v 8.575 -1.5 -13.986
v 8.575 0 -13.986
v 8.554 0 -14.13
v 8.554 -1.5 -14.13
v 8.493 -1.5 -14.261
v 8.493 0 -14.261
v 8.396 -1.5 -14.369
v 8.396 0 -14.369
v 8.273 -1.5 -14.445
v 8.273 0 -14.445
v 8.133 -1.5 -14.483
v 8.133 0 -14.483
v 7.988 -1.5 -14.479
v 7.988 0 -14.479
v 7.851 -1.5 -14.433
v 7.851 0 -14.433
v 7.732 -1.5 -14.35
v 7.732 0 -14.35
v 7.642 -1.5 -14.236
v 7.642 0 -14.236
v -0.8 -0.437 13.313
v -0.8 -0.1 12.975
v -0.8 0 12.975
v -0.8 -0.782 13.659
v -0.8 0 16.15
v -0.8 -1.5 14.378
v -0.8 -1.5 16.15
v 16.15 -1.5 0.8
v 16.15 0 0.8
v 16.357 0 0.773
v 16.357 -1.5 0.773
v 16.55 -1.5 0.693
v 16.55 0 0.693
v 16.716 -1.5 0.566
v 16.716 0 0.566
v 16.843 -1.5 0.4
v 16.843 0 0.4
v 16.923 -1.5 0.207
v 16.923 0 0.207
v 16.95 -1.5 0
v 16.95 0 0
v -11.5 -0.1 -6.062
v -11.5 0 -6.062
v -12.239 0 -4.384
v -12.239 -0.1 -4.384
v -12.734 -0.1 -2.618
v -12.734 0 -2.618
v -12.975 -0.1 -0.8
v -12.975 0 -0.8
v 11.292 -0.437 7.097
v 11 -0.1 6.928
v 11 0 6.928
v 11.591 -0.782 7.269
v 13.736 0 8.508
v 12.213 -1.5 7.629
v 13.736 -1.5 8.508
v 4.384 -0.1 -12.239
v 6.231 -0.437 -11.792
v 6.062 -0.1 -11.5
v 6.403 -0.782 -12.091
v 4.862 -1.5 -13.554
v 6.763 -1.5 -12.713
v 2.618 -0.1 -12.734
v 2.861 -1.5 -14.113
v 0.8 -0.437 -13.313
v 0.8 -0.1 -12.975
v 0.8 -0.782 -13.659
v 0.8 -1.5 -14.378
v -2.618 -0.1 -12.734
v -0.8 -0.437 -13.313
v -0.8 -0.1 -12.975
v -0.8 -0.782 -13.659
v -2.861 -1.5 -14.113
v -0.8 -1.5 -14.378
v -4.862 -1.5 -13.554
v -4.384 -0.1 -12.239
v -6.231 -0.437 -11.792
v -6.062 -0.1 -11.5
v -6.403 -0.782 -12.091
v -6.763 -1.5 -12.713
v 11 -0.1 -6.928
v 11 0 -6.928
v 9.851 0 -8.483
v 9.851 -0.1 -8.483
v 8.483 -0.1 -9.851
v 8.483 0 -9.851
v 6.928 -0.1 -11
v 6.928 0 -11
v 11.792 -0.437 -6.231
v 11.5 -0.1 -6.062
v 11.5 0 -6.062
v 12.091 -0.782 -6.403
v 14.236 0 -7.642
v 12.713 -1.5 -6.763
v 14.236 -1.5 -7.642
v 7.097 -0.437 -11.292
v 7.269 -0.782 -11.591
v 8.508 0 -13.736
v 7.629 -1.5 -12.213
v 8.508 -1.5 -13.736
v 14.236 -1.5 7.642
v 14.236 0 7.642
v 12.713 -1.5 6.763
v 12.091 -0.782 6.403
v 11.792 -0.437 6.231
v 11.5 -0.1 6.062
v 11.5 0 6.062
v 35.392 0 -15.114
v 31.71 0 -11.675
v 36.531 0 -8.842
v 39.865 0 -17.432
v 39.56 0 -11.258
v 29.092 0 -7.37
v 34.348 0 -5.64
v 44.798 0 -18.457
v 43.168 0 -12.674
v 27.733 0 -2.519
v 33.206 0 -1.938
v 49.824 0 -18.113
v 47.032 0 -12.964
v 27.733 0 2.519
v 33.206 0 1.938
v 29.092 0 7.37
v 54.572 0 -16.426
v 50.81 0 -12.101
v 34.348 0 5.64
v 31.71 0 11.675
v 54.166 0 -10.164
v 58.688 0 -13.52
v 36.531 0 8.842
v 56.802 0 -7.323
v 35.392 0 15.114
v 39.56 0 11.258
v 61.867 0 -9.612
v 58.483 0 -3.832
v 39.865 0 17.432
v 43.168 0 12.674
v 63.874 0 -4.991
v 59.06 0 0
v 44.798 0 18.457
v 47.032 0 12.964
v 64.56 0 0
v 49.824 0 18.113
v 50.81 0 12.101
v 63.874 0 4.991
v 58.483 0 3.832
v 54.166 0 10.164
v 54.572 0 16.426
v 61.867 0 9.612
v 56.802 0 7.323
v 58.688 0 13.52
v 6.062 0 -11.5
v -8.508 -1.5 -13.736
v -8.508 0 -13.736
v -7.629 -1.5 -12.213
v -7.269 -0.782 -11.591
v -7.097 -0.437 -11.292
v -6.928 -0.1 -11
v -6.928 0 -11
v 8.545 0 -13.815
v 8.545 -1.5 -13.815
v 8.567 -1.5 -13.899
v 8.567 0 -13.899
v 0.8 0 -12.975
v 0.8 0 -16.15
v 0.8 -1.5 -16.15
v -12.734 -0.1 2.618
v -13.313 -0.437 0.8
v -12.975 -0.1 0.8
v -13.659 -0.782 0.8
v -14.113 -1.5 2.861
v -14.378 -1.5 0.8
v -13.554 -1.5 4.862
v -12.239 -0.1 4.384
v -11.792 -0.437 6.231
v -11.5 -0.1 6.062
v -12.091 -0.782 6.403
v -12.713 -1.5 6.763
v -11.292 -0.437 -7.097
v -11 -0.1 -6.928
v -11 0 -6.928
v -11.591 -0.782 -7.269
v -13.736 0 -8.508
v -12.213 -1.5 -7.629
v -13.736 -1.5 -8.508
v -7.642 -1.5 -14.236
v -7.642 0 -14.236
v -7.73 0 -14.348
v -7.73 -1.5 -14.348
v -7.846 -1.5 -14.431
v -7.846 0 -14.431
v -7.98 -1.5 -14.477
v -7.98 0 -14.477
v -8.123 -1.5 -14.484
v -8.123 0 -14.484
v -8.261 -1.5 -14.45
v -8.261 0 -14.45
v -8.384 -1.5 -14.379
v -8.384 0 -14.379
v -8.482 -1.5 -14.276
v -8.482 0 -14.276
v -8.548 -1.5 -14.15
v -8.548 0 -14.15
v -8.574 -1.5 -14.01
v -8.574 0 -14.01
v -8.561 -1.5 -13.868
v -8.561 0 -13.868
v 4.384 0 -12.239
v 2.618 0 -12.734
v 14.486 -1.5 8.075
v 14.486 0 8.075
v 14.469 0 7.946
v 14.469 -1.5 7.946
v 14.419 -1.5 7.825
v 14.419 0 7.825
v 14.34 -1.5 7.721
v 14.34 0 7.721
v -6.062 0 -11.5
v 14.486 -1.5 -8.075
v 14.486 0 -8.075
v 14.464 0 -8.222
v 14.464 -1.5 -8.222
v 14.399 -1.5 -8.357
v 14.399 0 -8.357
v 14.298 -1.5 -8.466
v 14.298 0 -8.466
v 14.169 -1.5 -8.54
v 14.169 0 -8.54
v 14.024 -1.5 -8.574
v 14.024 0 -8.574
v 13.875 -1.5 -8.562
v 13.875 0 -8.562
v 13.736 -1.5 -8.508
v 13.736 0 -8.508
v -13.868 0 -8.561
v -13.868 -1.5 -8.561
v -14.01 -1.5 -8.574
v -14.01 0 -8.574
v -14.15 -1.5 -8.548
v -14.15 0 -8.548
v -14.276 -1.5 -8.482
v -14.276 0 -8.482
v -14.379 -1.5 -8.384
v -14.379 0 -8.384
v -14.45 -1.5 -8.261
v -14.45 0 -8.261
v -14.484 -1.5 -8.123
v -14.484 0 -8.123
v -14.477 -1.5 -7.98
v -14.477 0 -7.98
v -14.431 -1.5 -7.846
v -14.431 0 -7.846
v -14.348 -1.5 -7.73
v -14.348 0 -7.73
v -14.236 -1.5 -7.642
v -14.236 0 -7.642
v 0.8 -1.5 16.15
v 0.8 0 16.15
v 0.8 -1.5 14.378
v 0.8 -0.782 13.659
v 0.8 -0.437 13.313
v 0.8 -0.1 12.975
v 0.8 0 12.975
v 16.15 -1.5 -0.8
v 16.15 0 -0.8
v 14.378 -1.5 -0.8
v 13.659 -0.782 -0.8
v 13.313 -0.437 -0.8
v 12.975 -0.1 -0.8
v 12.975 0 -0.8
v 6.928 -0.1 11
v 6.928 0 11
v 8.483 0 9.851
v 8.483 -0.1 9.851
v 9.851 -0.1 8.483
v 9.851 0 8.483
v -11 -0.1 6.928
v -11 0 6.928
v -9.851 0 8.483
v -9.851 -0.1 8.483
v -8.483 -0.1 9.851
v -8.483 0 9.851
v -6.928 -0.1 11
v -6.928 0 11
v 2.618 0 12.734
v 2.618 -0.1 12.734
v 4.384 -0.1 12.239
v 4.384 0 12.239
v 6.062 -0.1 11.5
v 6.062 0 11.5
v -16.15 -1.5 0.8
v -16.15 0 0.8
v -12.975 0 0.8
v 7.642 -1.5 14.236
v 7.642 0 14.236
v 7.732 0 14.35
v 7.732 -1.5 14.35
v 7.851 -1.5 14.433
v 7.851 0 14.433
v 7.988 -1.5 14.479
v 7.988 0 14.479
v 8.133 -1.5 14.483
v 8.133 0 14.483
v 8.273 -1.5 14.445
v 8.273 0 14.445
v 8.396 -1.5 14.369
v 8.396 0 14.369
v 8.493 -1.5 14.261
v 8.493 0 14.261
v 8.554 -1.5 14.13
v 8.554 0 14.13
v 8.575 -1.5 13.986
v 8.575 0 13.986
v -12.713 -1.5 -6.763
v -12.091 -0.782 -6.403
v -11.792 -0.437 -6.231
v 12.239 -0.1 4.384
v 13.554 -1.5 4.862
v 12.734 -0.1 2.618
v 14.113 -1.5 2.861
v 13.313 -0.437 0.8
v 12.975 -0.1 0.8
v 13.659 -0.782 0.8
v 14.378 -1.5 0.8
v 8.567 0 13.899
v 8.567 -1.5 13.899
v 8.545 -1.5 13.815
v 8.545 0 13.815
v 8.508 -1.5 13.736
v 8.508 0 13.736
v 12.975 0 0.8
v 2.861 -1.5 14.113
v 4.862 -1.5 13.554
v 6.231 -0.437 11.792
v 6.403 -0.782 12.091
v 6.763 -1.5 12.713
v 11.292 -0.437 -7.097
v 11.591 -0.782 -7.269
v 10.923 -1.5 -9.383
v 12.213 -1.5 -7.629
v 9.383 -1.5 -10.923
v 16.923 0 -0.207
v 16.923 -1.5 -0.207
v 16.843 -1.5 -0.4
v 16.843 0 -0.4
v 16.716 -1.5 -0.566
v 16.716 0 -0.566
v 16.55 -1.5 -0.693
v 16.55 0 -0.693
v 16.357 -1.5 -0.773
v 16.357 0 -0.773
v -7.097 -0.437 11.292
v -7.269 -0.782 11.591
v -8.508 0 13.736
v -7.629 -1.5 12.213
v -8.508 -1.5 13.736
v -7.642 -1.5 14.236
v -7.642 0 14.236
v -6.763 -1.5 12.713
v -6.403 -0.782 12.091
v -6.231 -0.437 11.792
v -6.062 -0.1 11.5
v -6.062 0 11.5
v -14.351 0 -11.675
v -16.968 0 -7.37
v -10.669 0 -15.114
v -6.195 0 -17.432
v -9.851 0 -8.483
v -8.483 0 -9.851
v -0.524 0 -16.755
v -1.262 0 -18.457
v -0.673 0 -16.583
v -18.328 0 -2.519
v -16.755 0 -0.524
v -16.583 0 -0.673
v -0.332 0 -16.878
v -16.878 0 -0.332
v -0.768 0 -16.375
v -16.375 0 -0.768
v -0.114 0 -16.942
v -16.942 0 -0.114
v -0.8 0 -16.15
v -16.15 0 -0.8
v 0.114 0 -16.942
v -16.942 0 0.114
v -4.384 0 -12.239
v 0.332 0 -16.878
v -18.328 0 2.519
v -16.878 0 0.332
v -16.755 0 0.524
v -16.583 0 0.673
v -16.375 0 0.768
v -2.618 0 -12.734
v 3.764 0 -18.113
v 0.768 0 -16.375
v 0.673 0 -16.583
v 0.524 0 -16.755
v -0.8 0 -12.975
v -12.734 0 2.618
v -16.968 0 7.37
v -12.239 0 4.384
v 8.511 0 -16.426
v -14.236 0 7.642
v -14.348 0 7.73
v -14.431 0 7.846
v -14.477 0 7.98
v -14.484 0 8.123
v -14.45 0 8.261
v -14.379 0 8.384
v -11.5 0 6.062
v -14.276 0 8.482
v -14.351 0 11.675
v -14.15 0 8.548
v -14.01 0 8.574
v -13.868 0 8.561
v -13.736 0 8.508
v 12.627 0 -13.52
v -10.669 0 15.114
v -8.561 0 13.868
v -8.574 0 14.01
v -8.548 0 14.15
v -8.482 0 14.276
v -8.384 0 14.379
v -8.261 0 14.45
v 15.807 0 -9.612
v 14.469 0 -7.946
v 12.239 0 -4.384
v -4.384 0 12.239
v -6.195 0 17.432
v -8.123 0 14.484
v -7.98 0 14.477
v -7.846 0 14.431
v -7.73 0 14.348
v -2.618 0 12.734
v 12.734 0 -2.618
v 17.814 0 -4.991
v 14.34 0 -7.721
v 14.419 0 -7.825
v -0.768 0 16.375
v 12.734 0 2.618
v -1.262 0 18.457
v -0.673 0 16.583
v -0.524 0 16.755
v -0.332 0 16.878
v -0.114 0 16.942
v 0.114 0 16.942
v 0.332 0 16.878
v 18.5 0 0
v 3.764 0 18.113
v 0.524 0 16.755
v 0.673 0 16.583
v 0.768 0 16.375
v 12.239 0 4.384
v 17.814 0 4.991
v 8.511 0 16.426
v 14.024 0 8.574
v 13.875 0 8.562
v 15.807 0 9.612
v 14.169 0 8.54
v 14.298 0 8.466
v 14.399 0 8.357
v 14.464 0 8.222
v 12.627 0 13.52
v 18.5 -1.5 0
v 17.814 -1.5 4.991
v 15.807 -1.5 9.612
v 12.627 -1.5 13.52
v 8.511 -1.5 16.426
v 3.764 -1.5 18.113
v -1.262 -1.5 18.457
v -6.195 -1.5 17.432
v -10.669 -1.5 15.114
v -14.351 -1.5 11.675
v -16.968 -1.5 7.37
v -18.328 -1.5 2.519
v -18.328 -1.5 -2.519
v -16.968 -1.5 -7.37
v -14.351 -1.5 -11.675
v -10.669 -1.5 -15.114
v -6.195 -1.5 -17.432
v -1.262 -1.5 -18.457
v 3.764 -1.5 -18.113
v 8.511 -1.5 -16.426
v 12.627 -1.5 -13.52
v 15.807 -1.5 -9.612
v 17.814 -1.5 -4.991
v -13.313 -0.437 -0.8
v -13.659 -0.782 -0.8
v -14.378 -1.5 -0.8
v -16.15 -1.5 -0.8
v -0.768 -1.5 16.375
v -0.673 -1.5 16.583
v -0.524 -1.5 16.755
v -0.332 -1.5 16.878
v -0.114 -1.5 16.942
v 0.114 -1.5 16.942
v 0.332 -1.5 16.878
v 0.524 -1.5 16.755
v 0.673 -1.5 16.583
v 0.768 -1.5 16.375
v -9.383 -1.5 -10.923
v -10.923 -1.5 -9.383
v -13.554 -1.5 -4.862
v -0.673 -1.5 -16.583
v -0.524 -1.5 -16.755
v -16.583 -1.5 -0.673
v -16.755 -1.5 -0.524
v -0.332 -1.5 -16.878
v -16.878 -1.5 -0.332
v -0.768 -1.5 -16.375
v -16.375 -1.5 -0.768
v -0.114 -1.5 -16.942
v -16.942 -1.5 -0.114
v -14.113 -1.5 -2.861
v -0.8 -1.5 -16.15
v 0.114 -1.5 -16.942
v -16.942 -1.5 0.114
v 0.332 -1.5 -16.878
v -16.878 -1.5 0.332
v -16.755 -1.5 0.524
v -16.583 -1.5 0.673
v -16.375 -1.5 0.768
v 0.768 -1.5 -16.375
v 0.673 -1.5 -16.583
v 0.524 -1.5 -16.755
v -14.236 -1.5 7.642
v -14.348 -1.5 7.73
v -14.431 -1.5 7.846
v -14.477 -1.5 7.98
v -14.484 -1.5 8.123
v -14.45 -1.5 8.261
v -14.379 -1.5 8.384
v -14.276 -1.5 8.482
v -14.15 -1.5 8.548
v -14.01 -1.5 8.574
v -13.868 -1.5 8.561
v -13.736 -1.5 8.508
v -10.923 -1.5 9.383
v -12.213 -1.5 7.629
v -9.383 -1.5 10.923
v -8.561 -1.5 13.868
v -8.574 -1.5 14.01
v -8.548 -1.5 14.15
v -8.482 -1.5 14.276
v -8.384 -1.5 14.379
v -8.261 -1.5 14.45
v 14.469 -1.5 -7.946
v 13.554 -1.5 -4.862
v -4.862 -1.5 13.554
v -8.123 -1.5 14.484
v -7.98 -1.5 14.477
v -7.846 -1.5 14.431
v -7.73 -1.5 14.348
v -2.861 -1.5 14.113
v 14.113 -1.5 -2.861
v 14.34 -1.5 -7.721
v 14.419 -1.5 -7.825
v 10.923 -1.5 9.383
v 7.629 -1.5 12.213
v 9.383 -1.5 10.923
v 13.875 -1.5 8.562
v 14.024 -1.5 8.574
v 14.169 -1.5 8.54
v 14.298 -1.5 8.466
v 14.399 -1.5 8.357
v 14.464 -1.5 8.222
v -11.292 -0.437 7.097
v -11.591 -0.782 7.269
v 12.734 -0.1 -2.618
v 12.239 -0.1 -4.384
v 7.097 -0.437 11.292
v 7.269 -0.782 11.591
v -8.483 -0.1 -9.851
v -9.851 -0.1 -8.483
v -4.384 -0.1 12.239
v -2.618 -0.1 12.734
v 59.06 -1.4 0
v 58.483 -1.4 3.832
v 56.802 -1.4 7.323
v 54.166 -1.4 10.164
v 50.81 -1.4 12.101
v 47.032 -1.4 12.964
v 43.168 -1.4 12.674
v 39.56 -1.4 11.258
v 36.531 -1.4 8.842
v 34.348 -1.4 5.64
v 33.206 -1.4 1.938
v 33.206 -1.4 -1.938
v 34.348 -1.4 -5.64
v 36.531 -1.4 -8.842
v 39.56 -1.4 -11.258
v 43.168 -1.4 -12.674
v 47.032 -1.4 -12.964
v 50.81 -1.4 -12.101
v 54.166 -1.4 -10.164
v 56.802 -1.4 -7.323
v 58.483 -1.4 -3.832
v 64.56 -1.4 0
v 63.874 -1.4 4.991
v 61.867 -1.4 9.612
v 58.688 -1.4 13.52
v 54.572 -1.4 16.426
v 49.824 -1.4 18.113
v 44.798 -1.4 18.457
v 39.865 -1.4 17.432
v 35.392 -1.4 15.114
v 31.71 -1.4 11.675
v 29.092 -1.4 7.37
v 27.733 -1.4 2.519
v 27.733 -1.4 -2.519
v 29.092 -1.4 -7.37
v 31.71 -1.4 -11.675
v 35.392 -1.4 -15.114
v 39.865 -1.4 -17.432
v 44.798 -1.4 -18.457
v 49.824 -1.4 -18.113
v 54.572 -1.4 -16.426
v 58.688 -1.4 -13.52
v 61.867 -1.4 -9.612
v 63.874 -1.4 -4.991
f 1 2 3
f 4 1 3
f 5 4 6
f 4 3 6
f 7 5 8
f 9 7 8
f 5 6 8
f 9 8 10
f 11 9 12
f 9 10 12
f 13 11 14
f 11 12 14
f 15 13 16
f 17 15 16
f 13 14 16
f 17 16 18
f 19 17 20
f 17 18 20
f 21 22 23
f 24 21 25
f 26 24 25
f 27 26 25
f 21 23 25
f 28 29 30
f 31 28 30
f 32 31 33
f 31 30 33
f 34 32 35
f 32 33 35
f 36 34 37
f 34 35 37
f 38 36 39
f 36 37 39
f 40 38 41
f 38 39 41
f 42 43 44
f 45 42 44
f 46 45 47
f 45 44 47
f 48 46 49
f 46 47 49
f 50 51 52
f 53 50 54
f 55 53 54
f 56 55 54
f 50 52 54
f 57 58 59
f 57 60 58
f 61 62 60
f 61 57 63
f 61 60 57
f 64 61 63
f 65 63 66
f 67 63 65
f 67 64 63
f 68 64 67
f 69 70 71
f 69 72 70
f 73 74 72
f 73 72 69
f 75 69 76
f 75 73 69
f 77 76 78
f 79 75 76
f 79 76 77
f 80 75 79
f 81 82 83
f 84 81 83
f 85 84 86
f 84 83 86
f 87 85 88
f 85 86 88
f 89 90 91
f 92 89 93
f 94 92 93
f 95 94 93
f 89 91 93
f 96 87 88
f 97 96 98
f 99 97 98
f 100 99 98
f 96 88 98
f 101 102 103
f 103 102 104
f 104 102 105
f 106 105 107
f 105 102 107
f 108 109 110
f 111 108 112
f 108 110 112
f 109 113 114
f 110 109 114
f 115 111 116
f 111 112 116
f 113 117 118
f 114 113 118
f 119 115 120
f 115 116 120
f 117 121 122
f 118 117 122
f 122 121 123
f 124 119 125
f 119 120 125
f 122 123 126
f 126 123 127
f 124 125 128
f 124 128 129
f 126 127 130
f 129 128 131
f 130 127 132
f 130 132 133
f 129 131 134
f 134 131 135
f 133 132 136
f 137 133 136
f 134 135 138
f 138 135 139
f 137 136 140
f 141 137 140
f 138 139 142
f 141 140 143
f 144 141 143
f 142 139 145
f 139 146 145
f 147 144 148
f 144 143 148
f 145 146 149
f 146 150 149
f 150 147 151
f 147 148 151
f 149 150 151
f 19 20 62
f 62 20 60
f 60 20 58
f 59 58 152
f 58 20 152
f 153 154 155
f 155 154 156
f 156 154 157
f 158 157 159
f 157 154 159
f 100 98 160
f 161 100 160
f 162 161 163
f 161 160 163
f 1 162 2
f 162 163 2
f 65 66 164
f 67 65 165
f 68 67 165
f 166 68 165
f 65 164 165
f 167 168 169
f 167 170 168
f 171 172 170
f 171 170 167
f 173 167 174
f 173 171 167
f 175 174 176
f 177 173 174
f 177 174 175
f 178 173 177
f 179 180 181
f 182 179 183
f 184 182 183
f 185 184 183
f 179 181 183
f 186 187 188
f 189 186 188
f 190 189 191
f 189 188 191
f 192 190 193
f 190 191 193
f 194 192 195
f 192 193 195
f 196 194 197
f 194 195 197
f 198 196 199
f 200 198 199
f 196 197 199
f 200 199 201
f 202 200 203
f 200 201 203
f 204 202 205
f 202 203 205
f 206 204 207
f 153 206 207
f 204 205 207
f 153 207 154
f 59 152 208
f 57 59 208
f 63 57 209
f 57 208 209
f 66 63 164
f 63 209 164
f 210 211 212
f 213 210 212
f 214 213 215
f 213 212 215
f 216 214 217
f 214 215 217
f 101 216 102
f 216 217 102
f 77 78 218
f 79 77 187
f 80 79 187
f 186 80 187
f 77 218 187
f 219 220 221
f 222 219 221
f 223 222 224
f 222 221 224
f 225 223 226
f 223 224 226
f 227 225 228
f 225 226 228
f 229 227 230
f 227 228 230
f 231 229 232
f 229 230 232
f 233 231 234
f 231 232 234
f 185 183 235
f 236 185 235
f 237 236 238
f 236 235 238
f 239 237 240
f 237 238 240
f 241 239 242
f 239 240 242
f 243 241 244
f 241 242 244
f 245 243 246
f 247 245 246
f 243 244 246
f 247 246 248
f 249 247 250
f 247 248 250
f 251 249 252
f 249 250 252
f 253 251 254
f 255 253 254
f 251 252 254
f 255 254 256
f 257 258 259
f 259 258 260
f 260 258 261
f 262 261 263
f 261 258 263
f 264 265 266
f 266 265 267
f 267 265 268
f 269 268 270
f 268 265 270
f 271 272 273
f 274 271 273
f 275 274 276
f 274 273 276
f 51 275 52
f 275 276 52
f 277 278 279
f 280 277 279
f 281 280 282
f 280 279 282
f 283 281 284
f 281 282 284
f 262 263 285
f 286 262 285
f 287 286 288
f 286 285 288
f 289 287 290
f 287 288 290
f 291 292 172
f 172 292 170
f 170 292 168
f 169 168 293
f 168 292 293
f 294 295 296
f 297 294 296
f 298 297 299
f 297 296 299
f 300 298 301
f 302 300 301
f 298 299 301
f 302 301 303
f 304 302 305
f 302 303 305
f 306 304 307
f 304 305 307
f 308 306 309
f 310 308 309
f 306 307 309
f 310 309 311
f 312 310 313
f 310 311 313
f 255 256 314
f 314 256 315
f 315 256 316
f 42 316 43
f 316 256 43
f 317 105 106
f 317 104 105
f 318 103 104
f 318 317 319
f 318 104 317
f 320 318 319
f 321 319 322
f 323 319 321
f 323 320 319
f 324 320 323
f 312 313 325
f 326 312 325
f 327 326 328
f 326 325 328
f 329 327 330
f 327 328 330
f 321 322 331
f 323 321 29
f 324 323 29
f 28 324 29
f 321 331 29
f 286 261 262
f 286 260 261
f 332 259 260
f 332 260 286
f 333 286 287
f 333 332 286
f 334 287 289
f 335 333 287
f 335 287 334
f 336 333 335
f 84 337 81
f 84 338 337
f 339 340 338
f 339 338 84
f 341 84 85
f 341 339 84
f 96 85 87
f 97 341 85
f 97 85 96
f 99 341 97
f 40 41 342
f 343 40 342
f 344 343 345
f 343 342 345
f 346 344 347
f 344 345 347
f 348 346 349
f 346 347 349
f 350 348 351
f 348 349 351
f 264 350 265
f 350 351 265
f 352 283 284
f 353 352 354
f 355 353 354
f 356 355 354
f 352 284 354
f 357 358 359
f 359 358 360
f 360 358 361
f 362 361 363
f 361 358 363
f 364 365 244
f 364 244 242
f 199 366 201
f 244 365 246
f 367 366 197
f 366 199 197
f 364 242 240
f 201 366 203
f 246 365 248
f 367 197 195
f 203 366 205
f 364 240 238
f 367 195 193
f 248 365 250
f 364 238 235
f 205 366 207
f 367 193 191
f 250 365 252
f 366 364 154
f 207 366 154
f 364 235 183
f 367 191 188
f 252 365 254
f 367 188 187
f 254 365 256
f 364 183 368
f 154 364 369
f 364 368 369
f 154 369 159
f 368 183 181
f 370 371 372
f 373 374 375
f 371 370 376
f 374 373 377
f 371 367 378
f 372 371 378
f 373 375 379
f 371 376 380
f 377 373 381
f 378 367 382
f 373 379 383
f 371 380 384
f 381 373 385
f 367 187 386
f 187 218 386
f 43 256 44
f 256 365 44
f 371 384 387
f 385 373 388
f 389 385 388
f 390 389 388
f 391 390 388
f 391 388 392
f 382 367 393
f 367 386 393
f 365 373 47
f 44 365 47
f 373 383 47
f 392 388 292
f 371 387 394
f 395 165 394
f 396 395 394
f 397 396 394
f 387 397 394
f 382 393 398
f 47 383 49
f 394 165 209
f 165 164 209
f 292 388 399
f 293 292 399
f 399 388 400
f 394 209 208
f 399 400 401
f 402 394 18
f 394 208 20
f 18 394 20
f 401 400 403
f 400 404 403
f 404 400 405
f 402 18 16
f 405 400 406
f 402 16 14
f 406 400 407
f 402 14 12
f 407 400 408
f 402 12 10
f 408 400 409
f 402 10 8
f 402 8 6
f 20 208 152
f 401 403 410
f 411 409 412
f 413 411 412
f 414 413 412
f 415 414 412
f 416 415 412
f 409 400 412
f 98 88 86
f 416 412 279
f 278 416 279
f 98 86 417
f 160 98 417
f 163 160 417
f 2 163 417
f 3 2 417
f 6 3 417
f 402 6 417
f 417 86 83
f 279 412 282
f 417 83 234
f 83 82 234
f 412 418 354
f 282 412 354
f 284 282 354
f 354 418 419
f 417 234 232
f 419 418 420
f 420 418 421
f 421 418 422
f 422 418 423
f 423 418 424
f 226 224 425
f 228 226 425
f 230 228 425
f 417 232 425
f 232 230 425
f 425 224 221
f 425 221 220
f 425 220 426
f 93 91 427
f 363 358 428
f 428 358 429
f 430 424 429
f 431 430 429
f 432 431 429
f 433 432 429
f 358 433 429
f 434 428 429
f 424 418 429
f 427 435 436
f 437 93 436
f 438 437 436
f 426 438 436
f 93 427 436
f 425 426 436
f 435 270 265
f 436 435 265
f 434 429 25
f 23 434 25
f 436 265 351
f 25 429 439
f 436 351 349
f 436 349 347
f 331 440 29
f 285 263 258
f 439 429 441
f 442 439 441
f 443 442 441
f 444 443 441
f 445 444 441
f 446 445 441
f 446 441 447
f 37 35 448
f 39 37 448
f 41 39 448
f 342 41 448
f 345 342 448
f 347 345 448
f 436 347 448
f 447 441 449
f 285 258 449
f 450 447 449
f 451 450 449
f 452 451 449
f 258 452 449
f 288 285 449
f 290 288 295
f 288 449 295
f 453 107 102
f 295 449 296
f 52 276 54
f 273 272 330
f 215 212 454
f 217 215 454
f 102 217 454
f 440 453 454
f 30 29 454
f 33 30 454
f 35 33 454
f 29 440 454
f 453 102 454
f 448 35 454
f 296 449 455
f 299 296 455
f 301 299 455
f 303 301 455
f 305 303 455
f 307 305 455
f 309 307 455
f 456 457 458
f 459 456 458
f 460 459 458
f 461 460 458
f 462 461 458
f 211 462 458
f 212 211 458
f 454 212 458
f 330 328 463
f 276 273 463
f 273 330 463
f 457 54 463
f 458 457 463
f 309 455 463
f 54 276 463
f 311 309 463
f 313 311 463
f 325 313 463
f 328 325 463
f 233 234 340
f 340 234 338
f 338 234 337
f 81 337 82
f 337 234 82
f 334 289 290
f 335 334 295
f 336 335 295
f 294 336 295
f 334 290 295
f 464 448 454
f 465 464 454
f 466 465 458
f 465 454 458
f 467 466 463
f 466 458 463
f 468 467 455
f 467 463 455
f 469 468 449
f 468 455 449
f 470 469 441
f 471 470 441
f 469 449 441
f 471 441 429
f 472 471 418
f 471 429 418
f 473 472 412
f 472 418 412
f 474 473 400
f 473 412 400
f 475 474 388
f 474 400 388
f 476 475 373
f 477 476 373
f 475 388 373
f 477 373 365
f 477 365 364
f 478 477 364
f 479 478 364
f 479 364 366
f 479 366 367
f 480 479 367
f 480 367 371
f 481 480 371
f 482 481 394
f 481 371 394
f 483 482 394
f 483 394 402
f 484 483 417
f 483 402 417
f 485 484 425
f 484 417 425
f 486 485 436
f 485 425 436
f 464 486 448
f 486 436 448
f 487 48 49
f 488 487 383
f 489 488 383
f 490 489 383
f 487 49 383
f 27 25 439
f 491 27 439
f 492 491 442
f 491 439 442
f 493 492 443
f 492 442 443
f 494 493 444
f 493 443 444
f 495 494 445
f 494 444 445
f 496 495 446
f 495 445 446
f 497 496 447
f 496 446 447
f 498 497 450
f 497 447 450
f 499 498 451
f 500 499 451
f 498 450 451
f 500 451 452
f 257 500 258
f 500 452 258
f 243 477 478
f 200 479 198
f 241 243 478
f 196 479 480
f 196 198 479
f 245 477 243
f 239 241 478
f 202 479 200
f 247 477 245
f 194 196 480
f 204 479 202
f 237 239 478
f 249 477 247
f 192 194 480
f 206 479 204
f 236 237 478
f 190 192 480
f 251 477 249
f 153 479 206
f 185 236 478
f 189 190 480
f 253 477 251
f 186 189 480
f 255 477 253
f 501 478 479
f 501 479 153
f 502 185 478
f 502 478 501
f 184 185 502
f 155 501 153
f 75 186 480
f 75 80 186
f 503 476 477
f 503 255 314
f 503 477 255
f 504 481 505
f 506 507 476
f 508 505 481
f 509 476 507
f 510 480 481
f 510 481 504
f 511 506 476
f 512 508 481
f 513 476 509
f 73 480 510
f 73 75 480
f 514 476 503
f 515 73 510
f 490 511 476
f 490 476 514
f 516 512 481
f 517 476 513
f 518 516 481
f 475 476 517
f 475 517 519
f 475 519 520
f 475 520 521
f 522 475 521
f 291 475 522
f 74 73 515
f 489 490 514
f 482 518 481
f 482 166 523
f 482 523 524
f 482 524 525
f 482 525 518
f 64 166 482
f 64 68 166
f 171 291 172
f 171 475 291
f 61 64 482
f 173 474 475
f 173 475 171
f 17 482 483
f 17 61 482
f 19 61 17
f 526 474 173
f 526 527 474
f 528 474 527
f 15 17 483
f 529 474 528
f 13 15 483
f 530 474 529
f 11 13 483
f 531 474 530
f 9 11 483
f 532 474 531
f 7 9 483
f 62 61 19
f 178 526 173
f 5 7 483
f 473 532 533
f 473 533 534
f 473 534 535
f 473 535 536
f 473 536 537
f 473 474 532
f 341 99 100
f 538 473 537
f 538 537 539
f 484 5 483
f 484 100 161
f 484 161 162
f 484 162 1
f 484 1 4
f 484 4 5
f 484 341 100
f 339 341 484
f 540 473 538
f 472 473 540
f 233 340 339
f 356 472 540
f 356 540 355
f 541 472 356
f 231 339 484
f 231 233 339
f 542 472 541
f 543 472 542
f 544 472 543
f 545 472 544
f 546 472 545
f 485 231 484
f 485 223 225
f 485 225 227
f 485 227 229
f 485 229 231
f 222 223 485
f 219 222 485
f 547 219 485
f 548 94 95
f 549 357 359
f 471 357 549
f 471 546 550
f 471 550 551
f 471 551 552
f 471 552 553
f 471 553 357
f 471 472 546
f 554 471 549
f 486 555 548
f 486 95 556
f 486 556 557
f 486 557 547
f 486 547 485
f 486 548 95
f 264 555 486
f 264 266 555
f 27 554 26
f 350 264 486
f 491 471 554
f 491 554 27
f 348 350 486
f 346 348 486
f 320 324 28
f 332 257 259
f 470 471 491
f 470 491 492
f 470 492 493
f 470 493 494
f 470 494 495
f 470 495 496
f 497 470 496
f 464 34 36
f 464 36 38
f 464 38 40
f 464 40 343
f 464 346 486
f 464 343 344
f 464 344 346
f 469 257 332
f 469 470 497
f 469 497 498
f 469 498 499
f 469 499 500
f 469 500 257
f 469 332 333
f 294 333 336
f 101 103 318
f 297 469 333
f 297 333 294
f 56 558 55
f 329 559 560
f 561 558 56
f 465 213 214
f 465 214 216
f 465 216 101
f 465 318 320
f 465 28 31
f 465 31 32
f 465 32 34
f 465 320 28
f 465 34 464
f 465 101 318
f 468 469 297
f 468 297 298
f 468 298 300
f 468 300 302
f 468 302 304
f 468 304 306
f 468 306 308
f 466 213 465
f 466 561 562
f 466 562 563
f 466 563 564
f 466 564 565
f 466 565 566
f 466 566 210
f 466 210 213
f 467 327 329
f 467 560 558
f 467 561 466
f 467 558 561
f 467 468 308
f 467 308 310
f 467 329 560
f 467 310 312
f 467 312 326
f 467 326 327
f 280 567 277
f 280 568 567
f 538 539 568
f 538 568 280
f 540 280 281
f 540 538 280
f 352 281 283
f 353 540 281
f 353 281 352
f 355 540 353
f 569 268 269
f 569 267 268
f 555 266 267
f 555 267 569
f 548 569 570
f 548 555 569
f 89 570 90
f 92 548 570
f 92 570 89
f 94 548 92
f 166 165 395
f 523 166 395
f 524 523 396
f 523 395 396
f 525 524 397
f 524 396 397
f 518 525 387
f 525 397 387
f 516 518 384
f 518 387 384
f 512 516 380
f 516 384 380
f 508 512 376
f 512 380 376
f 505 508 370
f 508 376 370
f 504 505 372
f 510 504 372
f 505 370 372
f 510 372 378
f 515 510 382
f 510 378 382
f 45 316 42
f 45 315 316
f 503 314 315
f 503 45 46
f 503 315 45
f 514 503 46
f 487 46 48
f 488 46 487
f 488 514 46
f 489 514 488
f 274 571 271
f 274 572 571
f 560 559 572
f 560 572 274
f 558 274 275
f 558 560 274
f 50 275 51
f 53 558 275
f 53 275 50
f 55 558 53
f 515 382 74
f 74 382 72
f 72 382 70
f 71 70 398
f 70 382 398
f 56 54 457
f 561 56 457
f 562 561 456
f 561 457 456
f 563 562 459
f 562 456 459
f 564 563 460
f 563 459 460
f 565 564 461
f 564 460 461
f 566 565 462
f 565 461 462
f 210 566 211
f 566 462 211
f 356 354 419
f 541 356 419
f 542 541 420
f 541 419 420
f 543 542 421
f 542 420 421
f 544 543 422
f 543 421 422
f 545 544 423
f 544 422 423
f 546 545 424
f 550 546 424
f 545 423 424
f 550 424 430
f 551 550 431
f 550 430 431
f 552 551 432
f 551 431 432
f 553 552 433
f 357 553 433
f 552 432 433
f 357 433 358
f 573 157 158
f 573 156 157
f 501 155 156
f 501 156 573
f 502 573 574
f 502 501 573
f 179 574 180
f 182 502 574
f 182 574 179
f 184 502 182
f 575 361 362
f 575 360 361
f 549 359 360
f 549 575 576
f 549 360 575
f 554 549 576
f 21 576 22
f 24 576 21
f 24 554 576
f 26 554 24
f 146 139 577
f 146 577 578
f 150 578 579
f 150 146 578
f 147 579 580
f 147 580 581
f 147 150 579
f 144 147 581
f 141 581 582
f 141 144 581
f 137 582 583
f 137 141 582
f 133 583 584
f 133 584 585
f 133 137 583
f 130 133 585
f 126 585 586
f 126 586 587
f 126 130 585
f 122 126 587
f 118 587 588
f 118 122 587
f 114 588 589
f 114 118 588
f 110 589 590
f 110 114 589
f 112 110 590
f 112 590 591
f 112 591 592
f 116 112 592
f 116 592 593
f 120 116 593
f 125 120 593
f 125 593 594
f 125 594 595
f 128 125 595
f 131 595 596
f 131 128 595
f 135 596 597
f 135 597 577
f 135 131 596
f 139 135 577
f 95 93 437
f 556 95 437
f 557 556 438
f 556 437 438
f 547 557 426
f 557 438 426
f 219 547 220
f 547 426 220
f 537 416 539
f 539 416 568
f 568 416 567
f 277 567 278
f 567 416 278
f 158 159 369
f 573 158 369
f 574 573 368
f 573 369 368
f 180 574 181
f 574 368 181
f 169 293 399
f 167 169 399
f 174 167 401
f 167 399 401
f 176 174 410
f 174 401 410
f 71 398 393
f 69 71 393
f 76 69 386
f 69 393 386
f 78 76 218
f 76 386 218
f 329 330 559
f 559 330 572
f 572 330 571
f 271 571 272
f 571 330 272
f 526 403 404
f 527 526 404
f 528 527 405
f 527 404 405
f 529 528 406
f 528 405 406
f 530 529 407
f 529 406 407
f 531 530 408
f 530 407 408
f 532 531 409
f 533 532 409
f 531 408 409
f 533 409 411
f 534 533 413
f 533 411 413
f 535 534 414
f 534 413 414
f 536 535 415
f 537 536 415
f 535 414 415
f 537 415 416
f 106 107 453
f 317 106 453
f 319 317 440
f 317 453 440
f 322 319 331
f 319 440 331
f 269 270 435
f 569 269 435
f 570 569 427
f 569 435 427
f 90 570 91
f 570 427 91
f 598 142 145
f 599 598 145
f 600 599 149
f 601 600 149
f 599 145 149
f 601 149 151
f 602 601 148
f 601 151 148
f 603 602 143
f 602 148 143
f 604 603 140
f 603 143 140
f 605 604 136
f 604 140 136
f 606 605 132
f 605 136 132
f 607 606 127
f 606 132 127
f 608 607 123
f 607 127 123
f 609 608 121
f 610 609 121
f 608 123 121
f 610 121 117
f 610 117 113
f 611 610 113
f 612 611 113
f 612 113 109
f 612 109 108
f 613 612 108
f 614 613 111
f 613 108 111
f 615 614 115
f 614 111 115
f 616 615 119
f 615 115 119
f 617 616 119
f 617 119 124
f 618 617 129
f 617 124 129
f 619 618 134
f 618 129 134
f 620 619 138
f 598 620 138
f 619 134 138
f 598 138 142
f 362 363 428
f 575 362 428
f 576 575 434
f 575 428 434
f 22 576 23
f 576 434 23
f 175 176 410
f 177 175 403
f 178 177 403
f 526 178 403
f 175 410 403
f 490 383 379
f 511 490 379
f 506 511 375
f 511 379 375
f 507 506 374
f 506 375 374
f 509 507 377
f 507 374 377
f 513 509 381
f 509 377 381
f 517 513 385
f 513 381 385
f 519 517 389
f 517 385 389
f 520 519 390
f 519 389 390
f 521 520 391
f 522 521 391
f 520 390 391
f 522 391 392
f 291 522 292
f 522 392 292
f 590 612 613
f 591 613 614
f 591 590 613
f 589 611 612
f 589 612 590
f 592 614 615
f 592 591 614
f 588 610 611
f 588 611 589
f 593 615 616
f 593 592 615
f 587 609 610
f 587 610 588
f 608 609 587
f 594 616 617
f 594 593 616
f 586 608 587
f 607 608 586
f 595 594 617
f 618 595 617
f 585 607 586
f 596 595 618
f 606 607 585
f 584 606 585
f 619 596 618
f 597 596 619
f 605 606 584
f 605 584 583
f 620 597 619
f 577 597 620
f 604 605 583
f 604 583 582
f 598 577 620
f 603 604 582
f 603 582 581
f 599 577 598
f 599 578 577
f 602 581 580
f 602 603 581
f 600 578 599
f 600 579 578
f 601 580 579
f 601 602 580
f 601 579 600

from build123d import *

# Parameters (mm, degrees)
F0_R     = 18.5
F1_DEPTH = 1.5
F2_SIZE  = 1.4
F0_R_2   = 13
F3_DEPTH = 1.4


with BuildPart() as f1:
    # F0 (on Front) → F1 (new body)
    with BuildSketch(Plane.XZ):
        Circle(F0_R)
        with BuildLine():
            ThreePointArc((11.5, 6.0621778265), (12.5173262382, 3.509493389), (12.9753612666, 0.8))
            Line((12.9753612666, 0.8), (16.15, 0.8))
            ThreePointArc((16.15, 0.8), (16.7156854249, 0.5656854249), (16.95, 0))
            ThreePointArc((16.95, 0), (16.7156854249, -0.5656854249), (16.15, -0.8))
            Line((16.15, -0.8), (12.9753612666, -0.8))
            ThreePointArc((12.9753612666, -0.8), (12.5173262382, -3.509493389), (11.5, -6.0621778265))
            Line((11.5, -6.0621778265), (14.2363102711, -7.6419872981))
            ThreePointArc((14.2363102711, -7.6419872981), (14.419322973, -7.825), (14.4863102711, -8.075))
            ThreePointArc((14.4863102711, -8.075), (14.2363102711, -8.5080127019), (13.7363102711, -8.5080127019))
            Line((13.7363102711, -8.5080127019), (11, -6.9282032303))
            ThreePointArc((11, -6.9282032303), (9.1923881554, -9.1923881554), (6.9282032303, -11))
            Line((6.9282032303, -11), (8.5080127019, -13.7363102711))
            ThreePointArc((8.5080127019, -13.7363102711), (8.5579629131, -13.8569007486), (8.575, -13.9863102711))
            ThreePointArc((8.575, -13.9863102711), (8.2044095226, -14.4692731843), (7.6419872981, -14.2363102711))
            Line((7.6419872981, -14.2363102711), (6.0621778265, -11.5))
            ThreePointArc((6.0621778265, -11.5), (3.509493389, -12.5173262382), (0.8, -12.9753612666))
            Line((0.8, -12.9753612666), (0.8, -16.15))
            ThreePointArc((0.8, -16.15), (0, -16.95), (-0.8, -16.15))
            Line((-0.8, -16.15), (-0.8, -12.9753612666))
            ThreePointArc((-0.8, -12.9753612666), (-3.509493389, -12.5173262382), (-6.0621778265, -11.5))
            Line((-6.0621778265, -11.5), (-7.6419872981, -14.2363102711))
            ThreePointArc((-7.6419872981, -14.2363102711), (-8.325, -14.419322973), (-8.5080127019, -13.7363102711))
            Line((-8.5080127019, -13.7363102711), (-6.9282032303, -11))
            ThreePointArc((-6.9282032303, -11), (-9.1923881554, -9.1923881554), (-11, -6.9282032303))
            Line((-11, -6.9282032303), (-13.7363102711, -8.5080127019))
            ThreePointArc((-13.7363102711, -8.5080127019), (-14.419322973, -8.325), (-14.2363102711, -7.6419872981))
            Line((-14.2363102711, -7.6419872981), (-11.5, -6.0621778265))
            ThreePointArc((-11.5, -6.0621778265), (-12.5173262382, -3.509493389), (-12.9753612666, -0.8))
            Line((-12.9753612666, -0.8), (-16.15, -0.8))
            ThreePointArc((-16.15, -0.8), (-16.95, 0), (-16.15, 0.8))
            Line((-16.15, 0.8), (-12.9753612666, 0.8))
            ThreePointArc((-12.9753612666, 0.8), (-12.5173262382, 3.509493389), (-11.5, 6.0621778265))
            Line((-11.5, 6.0621778265), (-14.2363102711, 7.6419872981))
            ThreePointArc((-14.2363102711, 7.6419872981), (-14.419322973, 8.325), (-13.7363102711, 8.5080127019))
            Line((-13.7363102711, 8.5080127019), (-11, 6.9282032303))
            ThreePointArc((-11, 6.9282032303), (-9.1923881554, 9.1923881554), (-6.9282032303, 11))
            Line((-6.9282032303, 11), (-8.5080127019, 13.7363102711))
            ThreePointArc((-8.5080127019, 13.7363102711), (-8.325, 14.419322973), (-7.6419872981, 14.2363102711))
            Line((-7.6419872981, 14.2363102711), (-6.0621778265, 11.5))
            ThreePointArc((-6.0621778265, 11.5), (-3.509493389, 12.5173262382), (-0.8, 12.9753612666))
            Line((-0.8, 12.9753612666), (-0.8, 16.15))
            ThreePointArc((-0.8, 16.15), (0, 16.95), (0.8, 16.15))
            Line((0.8, 16.15), (0.8, 12.9753612666))
            ThreePointArc((0.8, 12.9753612666), (3.509493389, 12.5173262382), (6.0621778265, 11.5))
            Line((6.0621778265, 11.5), (7.6419872981, 14.2363102711))
            ThreePointArc((7.6419872981, 14.2363102711), (8.2044095226, 14.4692731843), (8.575, 13.9863102711))
            ThreePointArc((8.575, 13.9863102711), (8.5579629131, 13.8569007486), (8.5080127019, 13.7363102711))
            Line((8.5080127019, 13.7363102711), (6.9282032303, 11))
            ThreePointArc((6.9282032303, 11), (9.1923881554, 9.1923881554), (11, 6.9282032303))
            Line((11, 6.9282032303), (13.7363102711, 8.5080127019))
            ThreePointArc((13.7363102711, 8.5080127019), (14.2363102711, 8.5080127019), (14.4863102711, 8.075))
            ThreePointArc((14.4863102711, 8.075), (14.419322973, 7.825), (14.2363102711, 7.6419872981))
            Line((14.2363102711, 7.6419872981), (11.5, 6.0621778265))
        make_face(mode=Mode.SUBTRACT)
    extrude(amount=F1_DEPTH)

    # F2
    f2_edges = [f1.edges().sort_by_distance(p)[0] for p in [
        (-12.517326, -1.5, 3.509493),
        (-9.192388, -1.5, 9.192388),
        (-3.509493, -1.5, 12.517326),
        (3.509493, -1.5, 12.517326),
        (9.192388, -1.5, 9.192388),
        (12.517326, -1.5, 3.509493),
        (12.517326, -1.5, -3.509493),
        (9.192388, -1.5, -9.192388),
        (3.509493, -1.5, -12.517326),
        (-3.509493, -1.5, -12.517326),
        (-9.192388, -1.5, -9.192388),
        (-12.517326, -1.5, -3.509493),
    ]]
    chamfer(f2_edges, length=F2_SIZE)


with BuildPart() as f3:
    # F0 (on Front) → F3 (new body)
    with BuildSketch(Plane.XZ):
        with Locations((46.060487628, 0)):
            Circle(F0_R)
        with Locations((46.060487628, 0)):
            Circle(F0_R_2, mode=Mode.SUBTRACT)
    extrude(amount=F3_DEPTH)


solid = Compound([f1.part, f3.part])
